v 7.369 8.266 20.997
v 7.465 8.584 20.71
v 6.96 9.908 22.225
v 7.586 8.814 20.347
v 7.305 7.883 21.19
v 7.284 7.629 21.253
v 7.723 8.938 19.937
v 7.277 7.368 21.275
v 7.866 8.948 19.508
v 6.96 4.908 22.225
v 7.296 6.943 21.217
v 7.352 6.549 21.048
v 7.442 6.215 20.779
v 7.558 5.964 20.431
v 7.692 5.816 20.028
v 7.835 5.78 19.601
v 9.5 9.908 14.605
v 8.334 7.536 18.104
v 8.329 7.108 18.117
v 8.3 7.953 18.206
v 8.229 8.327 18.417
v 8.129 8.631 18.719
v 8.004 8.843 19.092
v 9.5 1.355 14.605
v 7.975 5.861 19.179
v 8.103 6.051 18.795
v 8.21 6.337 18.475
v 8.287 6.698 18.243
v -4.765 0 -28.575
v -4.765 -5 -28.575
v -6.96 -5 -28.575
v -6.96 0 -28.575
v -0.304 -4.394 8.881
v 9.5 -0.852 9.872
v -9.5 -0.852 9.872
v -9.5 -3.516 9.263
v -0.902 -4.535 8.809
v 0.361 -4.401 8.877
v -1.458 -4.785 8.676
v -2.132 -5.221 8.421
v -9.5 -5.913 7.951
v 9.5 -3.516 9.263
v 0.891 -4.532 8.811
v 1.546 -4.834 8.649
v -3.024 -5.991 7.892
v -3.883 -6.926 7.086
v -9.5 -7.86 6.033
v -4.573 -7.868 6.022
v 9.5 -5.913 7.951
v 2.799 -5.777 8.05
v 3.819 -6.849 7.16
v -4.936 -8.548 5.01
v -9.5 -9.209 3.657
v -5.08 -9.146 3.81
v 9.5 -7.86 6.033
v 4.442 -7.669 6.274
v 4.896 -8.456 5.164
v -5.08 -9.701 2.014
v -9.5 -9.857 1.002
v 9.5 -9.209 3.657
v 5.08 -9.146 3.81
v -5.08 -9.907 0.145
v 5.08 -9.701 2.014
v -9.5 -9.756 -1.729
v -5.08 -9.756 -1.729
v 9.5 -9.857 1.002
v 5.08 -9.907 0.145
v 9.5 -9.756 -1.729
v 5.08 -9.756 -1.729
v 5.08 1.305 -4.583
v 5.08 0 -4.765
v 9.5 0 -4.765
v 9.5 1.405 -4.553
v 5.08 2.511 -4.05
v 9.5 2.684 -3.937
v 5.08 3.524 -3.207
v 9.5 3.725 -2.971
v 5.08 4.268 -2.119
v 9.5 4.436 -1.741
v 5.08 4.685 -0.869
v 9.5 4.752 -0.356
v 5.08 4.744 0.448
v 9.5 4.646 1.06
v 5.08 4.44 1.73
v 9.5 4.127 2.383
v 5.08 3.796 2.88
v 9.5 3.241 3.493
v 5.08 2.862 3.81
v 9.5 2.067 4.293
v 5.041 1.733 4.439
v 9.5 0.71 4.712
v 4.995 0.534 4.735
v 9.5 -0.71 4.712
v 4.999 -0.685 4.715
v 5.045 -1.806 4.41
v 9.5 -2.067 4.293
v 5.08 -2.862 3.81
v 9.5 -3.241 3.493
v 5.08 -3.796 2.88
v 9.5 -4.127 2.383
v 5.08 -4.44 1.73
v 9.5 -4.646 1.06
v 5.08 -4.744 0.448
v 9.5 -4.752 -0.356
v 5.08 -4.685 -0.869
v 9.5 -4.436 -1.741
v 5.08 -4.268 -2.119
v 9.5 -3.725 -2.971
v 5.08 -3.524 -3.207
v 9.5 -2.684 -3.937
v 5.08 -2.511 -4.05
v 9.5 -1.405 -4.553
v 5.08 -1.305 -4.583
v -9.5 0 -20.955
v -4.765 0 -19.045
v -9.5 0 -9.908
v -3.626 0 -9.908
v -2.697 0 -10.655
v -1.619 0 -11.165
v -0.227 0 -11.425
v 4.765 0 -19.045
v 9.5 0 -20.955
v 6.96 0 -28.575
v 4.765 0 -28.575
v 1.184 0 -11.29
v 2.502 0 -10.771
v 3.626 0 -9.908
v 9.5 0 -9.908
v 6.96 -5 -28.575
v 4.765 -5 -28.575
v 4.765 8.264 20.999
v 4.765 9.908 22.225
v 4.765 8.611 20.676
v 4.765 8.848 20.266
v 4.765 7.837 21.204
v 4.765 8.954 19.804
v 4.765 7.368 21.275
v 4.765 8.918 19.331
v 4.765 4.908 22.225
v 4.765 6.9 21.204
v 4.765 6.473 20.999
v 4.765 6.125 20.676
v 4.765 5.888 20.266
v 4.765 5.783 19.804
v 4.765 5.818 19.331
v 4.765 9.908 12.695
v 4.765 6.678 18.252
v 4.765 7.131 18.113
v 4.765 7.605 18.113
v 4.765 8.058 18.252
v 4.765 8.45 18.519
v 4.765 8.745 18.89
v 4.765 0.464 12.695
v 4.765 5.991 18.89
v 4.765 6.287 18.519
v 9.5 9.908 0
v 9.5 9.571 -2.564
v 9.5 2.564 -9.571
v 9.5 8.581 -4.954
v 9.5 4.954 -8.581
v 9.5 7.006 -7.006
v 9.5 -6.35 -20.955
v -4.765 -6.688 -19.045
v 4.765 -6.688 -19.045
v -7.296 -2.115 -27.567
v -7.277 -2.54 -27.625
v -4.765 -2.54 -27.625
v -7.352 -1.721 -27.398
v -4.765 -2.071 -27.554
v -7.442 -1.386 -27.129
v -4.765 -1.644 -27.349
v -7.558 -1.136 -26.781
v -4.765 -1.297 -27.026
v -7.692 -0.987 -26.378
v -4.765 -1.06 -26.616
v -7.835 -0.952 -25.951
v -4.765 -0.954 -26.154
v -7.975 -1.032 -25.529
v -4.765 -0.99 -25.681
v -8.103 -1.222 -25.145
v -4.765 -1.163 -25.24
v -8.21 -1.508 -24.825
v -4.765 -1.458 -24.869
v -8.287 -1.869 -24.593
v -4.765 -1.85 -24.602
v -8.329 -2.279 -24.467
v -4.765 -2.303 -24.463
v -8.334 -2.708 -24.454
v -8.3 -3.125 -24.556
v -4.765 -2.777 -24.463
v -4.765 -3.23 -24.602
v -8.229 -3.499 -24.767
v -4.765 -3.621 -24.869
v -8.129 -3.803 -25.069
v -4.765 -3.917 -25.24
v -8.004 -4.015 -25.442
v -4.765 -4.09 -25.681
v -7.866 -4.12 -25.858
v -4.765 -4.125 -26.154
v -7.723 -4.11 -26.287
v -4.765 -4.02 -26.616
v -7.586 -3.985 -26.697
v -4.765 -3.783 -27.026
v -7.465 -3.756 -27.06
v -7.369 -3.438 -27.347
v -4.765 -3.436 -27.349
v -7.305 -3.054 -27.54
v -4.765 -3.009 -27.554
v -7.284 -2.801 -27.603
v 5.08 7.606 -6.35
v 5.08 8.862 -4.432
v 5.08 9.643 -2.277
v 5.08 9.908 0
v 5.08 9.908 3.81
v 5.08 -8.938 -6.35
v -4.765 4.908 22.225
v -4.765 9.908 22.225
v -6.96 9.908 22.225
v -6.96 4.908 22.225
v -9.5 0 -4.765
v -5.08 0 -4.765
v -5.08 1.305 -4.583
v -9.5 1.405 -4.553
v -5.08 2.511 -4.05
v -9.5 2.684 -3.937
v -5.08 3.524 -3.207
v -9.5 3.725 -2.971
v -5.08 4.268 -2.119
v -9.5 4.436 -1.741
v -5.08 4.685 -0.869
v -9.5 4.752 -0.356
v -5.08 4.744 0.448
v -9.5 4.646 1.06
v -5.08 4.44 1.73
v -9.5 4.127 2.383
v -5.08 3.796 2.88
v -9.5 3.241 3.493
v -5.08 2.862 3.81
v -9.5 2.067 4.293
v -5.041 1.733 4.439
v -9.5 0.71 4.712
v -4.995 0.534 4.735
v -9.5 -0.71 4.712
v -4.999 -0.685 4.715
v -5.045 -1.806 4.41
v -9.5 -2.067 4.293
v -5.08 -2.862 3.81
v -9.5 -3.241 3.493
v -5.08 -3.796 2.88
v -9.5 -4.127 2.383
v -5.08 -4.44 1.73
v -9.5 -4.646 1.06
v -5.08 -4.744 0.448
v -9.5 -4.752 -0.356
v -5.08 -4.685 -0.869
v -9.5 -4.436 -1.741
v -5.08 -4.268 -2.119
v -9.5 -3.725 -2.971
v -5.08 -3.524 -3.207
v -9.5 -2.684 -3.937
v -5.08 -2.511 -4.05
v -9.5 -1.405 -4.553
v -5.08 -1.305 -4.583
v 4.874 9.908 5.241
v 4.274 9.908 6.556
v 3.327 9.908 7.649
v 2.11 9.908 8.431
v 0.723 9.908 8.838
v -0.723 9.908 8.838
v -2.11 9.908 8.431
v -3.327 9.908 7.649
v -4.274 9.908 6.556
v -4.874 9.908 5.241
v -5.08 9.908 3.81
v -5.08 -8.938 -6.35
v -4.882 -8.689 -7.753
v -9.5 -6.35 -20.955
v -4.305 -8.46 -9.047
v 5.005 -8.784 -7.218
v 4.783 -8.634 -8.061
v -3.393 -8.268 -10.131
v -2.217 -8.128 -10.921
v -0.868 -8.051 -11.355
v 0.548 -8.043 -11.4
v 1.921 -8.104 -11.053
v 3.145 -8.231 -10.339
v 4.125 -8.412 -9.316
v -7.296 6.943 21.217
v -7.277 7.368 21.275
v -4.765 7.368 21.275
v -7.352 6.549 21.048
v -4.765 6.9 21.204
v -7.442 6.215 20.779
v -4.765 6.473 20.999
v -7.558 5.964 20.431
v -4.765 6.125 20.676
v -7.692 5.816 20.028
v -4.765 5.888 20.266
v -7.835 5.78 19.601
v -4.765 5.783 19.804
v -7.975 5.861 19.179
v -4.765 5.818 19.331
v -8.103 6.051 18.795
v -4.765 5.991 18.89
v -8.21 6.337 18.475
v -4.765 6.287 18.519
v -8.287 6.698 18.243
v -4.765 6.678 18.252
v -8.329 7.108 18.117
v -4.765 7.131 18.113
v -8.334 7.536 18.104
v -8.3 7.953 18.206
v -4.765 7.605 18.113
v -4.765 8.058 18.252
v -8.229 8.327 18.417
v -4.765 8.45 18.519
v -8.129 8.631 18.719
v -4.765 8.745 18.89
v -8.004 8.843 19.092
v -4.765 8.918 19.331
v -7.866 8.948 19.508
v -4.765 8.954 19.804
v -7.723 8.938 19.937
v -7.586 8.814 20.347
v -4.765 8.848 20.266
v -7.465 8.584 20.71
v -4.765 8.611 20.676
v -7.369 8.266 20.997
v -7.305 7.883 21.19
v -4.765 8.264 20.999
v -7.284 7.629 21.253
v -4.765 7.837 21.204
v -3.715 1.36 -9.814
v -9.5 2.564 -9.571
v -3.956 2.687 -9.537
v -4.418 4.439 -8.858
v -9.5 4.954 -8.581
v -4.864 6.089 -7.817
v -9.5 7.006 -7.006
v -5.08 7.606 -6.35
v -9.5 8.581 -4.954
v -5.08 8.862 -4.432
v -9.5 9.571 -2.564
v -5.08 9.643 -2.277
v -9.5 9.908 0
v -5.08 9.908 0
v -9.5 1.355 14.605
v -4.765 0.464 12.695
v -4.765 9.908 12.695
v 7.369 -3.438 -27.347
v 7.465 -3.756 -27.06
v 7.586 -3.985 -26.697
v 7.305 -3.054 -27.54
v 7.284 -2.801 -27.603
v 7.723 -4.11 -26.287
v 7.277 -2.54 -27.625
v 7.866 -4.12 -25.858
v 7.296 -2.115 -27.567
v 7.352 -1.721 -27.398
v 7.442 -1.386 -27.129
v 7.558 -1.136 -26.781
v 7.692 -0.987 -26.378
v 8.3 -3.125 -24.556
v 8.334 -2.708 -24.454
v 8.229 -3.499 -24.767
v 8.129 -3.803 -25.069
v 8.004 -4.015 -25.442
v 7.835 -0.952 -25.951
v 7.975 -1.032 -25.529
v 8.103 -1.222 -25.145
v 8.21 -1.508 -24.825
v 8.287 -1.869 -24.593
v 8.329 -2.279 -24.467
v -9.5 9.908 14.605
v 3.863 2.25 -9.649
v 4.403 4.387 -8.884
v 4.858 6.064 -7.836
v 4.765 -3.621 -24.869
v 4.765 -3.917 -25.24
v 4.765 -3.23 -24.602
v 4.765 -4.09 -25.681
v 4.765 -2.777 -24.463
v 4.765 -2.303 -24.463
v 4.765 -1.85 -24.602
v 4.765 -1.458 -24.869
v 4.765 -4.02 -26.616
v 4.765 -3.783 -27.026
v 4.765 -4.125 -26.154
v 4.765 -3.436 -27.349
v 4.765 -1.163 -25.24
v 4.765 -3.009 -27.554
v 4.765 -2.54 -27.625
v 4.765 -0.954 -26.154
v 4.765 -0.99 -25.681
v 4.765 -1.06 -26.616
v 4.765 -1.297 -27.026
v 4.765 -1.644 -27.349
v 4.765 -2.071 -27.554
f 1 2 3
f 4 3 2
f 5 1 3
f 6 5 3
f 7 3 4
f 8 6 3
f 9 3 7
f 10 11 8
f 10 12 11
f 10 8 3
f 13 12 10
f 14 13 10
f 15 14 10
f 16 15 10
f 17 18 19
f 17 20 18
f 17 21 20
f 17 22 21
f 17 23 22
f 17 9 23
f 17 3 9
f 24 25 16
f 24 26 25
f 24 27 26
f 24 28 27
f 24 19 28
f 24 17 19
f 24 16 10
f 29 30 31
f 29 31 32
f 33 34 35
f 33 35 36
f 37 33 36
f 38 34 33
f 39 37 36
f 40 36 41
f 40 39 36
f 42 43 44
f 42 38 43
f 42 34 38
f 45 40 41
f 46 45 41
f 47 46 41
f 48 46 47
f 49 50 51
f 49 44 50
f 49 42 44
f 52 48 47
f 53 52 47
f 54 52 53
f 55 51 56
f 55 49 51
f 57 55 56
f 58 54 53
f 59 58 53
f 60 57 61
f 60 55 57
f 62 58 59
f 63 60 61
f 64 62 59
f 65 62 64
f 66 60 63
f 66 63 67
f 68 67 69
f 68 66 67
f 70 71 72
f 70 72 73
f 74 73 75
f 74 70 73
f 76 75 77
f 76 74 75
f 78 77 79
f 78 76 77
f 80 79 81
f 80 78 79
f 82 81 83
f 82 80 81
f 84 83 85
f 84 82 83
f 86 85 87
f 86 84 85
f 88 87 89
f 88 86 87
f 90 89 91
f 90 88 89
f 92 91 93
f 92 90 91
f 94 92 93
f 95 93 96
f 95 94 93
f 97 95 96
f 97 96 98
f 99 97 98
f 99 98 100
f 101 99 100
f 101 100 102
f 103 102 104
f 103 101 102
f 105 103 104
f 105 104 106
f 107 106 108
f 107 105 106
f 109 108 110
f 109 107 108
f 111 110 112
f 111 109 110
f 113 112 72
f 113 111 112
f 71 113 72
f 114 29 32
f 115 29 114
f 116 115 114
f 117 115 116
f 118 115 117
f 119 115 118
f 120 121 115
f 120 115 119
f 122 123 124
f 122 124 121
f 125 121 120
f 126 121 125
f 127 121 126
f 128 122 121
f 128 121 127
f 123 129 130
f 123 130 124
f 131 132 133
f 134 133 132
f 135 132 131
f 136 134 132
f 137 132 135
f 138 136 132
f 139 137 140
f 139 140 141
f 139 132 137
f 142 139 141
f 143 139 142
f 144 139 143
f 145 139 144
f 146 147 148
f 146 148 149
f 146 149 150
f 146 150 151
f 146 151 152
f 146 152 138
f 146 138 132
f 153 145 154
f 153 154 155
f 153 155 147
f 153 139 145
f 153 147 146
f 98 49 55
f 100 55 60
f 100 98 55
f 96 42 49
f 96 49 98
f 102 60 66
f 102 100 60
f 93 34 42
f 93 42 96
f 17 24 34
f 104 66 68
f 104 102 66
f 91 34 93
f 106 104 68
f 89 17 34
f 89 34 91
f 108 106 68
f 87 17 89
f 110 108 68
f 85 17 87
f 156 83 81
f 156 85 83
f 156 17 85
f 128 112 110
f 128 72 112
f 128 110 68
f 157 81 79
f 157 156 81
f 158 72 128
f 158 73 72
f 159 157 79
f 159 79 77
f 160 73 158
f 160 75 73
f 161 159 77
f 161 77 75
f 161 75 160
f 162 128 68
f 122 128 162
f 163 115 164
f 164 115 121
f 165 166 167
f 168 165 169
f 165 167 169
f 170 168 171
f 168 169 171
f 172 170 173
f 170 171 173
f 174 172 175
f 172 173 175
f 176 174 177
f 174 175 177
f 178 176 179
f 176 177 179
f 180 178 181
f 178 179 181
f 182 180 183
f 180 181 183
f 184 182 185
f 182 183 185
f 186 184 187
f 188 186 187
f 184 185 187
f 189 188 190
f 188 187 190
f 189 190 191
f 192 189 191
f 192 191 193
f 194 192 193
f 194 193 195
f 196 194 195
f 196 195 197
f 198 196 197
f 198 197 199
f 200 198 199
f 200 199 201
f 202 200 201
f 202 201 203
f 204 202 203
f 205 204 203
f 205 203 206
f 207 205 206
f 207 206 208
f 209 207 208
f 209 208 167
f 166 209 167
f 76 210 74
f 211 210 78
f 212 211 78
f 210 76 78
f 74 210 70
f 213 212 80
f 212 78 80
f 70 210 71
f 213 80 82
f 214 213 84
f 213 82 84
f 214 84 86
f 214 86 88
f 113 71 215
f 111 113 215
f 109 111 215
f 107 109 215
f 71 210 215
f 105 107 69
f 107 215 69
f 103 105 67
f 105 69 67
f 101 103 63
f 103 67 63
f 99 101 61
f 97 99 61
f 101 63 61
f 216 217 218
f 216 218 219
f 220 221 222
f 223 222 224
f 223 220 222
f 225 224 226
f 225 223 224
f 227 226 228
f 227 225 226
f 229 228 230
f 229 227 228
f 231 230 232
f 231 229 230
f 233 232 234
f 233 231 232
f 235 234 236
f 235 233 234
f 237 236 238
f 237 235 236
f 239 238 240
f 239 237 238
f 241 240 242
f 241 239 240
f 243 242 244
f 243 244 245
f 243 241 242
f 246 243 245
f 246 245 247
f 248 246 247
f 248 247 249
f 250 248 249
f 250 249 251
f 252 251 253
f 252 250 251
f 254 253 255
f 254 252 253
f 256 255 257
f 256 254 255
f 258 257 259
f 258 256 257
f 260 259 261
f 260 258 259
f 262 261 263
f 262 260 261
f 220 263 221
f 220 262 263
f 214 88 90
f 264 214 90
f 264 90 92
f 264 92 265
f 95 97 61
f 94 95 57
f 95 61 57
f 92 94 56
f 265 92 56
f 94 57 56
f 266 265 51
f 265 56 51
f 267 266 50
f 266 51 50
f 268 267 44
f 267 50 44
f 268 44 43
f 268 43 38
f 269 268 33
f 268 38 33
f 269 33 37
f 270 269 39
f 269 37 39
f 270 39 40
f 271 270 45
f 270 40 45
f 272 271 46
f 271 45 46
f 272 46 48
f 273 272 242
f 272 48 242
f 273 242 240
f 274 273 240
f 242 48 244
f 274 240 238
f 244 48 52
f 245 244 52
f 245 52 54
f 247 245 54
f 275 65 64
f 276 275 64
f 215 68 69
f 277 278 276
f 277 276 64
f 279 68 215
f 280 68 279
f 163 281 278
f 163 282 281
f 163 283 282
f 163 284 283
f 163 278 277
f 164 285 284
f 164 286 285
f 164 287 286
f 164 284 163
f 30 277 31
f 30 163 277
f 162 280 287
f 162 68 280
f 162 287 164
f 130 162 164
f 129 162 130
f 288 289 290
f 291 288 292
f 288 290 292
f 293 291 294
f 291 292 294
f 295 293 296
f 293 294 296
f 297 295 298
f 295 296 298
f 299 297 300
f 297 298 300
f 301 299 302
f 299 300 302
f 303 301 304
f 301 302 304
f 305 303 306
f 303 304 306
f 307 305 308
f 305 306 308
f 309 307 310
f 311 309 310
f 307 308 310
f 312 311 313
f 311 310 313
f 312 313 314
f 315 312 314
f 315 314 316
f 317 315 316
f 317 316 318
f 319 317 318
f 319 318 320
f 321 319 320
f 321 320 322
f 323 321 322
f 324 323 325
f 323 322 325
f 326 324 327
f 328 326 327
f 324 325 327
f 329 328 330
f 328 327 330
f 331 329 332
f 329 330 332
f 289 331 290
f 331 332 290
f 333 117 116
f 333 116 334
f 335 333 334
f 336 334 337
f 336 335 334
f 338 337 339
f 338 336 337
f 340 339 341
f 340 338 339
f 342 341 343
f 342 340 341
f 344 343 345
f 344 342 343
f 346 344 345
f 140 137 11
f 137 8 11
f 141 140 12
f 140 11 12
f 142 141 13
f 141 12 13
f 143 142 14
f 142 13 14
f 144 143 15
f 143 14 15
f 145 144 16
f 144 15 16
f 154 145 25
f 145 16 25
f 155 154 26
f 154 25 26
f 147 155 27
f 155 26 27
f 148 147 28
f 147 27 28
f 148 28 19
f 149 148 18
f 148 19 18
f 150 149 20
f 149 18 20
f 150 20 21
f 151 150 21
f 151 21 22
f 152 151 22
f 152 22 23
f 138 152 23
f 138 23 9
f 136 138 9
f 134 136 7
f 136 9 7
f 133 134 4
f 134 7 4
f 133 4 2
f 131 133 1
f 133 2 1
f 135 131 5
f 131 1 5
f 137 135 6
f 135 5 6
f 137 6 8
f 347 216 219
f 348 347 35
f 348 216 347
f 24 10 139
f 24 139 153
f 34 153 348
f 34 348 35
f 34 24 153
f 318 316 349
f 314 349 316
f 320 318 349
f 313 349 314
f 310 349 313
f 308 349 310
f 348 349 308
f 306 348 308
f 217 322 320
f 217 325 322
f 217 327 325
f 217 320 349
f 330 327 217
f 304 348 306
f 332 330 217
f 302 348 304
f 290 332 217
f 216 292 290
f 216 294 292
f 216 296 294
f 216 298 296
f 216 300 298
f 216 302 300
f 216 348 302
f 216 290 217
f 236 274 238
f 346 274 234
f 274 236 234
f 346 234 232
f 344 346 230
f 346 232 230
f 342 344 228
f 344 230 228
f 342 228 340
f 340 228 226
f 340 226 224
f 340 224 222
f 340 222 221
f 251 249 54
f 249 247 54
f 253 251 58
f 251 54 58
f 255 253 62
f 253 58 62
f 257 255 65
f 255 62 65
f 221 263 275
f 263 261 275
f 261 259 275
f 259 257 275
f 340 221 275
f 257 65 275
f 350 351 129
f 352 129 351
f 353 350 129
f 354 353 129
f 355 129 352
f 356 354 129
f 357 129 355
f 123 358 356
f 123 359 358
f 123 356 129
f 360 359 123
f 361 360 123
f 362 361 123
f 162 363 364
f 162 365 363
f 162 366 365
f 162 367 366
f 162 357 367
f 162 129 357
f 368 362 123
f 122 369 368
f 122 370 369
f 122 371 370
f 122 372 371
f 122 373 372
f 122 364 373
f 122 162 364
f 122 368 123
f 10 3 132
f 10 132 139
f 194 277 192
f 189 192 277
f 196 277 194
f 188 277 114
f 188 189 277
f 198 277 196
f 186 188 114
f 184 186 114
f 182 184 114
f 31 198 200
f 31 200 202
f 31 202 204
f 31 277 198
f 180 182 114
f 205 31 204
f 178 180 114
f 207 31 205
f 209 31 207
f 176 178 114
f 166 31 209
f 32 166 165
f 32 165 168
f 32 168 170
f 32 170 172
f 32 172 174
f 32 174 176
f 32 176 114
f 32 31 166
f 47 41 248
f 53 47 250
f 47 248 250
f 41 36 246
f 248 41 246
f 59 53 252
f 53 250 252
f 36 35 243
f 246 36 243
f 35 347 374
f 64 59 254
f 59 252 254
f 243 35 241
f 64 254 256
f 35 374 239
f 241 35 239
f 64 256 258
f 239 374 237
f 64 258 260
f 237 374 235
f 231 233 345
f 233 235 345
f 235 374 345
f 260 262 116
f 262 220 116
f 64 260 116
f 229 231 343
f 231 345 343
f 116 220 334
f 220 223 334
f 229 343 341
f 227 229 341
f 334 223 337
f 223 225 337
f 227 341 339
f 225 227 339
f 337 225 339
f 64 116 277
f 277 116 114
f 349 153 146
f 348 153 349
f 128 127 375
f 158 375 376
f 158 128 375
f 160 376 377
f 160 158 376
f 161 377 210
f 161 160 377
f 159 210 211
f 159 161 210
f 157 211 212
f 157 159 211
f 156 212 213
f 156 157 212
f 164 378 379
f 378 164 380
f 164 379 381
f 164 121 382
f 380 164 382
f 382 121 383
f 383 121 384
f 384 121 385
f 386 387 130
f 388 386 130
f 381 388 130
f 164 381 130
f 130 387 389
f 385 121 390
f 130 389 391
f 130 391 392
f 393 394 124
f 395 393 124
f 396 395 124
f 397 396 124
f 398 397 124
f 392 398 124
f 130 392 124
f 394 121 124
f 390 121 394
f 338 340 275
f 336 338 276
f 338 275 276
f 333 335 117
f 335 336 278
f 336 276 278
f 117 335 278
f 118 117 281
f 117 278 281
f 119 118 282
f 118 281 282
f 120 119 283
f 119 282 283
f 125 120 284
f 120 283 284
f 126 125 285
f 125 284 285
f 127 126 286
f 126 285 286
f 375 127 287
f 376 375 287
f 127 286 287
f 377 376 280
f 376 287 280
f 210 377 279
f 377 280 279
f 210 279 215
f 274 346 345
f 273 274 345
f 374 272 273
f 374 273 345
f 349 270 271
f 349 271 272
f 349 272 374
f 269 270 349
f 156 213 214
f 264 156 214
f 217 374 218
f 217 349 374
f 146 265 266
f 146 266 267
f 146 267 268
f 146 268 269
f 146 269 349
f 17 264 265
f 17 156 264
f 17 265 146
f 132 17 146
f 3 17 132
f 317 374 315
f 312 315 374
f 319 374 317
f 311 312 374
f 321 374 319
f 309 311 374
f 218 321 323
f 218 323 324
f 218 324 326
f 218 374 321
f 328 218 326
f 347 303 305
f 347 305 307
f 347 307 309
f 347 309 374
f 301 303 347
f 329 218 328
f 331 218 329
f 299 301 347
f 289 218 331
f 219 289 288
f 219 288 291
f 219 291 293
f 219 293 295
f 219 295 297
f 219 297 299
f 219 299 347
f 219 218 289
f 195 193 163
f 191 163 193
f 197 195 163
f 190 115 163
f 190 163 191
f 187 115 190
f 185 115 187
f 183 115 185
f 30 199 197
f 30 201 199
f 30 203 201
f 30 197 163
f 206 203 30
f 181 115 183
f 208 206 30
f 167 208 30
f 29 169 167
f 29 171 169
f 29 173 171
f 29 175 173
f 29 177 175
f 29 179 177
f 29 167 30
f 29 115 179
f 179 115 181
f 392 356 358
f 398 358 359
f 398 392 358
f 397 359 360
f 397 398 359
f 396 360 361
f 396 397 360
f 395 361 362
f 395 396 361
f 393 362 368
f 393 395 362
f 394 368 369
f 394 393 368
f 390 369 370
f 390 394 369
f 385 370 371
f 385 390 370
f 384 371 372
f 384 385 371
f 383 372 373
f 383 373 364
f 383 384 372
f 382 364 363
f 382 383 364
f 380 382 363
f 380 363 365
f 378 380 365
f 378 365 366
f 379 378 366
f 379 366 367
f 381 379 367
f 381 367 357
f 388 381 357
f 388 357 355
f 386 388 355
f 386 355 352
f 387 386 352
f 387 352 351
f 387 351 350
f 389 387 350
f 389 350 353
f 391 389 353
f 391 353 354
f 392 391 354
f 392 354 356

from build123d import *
from OCP.BRepFilletAPI import BRepFilletAPI_MakeChamfer

# Parameters (mm, degrees)
SKETCH1_R               = 4.765
BOSS_EXTRUDE1_DEPTH     = 9.5
CHAMFER1_SIZE           = 2.54
CHAMFER1_SIZE2          = 7.62
CHAMFER3_SIZE           = 7.62
CHAMFER3_SIZE2          = 2.54
CUT_EXTRUDE2_DEPTH      = 32.701013029
CUT_EXTRUDE2_DEPTH_BACK = 32.701013029
SKETCH3_W               = 9.53
SKETCH3_H               = 9.53
CUT_EXTRUDE5_DEPTH      = 50
SKETCH4_R               = 1.59
CUT_EXTRUDE6_DEPTH      = 50


with BuildPart() as part:
    # Sketch1 → Boss-Extrude1 (new, symmetric)
    with BuildSketch(Plane(origin=(0, 0, 0), x_dir=(0, 0, -1), z_dir=(1, 0, 0))):
        with BuildLine():
            Line((0, 9.908259288), (-22.225, 9.908259288))
            Line((-22.225, 9.908259288), (-22.225, 4.908259288))
            Line((-22.225, 4.908259288), (-9.871538087, -0.852254607))
            ThreePointArc((-9.871538087, -0.852254607), (-6.033040367, -7.859772645), (1.728564082, -9.75631428))
            Line((1.728564082, -9.75631428), (28.574999999, -4.999826991))
            Line((28.574999999, -4.999826991), (28.574999999, 0.000173009))
            Line((28.574999999, 0.000173009), (9.908259287, 5.999e-05))
            ThreePointArc((9.908259287, 5.999e-05), (7.006176122, 7.006218542), (0, 9.908259288))
        make_face()
        Circle(SKETCH1_R, mode=Mode.SUBTRACT)
    extrude(amount=BOSS_EXTRUDE1_DEPTH, both=True)

    # Chamfer1: one chamfer whose edges measure the first distance from different faces: ONE call of the kernel's chamfer builder (chamfer() names one face for all edges)
    chamfer1_edges_1 = [part.edges().sort_by_distance(p)[0] for p in [
        (9.5, 7.408259288, 22.225),
    ]]
    chamfer1_side_1 = [part.faces().sort_by_distance(p)[0] for p in [
        (0, 7.408259288, 22.225),
    ]]
    chamfer1_edges_2 = [part.edges().sort_by_distance(p)[0] for p in [
        (9.5, -2.499826991, -28.574999999),
    ]]
    chamfer1_side_2 = [part.faces().sort_by_distance(p)[0] for p in [
        (0, -2.499826991, -28.574999999),
    ]]
    chamfer1 = BRepFilletAPI_MakeChamfer(part.part.solid().wrapped)
    for e in chamfer1_edges_1:
        chamfer1.Add(CHAMFER1_SIZE, CHAMFER1_SIZE2, e.wrapped, chamfer1_side_1[0].wrapped)  # the first distance lies on this face
    for e in chamfer1_edges_2:
        chamfer1.Add(CHAMFER1_SIZE, CHAMFER1_SIZE2, e.wrapped, chamfer1_side_2[0].wrapped)  # the first distance lies on this face
    add(Compound.cast(chamfer1.Shape()), mode=Mode.REPLACE)

    # Chamfer3
    chamfer3_edges = [part.edges().sort_by_distance(p)[0] for p in [
        (-9.5, 7.408259288, 22.225),
        (-9.5, -2.499826991, -28.574999999),
    ]]
    chamfer3_side = [part.faces().sort_by_distance(p)[0] for p in [
        (-9.5, 9.362976388, 11.1125),
    ]]
    chamfer(chamfer3_edges, length=CHAMFER3_SIZE, length2=CHAMFER3_SIZE2, reference=chamfer3_side[0])

    # Sketch2 → Cut-Extrude2 (cut, two sides: drawn at the far end of the back side and taken through both)
    with BuildSketch(Plane(origin=(0, 0, 0), x_dir=(1, 0, 0), z_dir=(0, 1, 0)).offset(-CUT_EXTRUDE2_DEPTH_BACK)):
        with BuildLine():
            Line((-5.08, -3.81), (-5.08, 6.35))
            ThreePointArc((-5.08, 6.35), (0, 11.43), (5.08, 6.35))
            Line((5.08, 6.35), (5.08, -3.81))
            ThreePointArc((5.08, -3.81), (0, -8.89), (-5.08, -3.81))
        make_face()
    extrude(amount=CUT_EXTRUDE2_DEPTH + CUT_EXTRUDE2_DEPTH_BACK, mode=Mode.SUBTRACT)

    # Sketch3 → Cut-Extrude5 (cut, symmetric)
    with BuildSketch(Plane(origin=(0, 0, 0), x_dir=(1, 0, 0), z_dir=(0, 0.9999999999816713, 6.054544672321462e-06))):
        Polygon((-4.765, -22.22494001), (-4.765, -26.288329998), (4.765, -26.288329998), (4.765, -22.22494001), (4.765, -12.69494001), (-4.765, -12.69494001), align=None)
        with Locations((0, 23.81)):
            Rectangle(SKETCH3_W, SKETCH3_H)
    extrude(amount=CUT_EXTRUDE5_DEPTH, both=True, mode=Mode.SUBTRACT)

    # Sketch4 → Cut-Extrude6 (cut, symmetric)
    with BuildSketch(Plane(origin=(0, 0, 0), x_dir=(0, 0, -1), z_dir=(1, 0, 0))):
        with Locations((26.034999999, -2.53984237)):
            Circle(SKETCH4_R)
        with Locations(Location((-19.685, 7.368259288, 0), (0, 0, 180))):
            Circle(SKETCH4_R)
    extrude(amount=CUT_EXTRUDE6_DEPTH, both=True, mode=Mode.SUBTRACT)


solid = part.part
